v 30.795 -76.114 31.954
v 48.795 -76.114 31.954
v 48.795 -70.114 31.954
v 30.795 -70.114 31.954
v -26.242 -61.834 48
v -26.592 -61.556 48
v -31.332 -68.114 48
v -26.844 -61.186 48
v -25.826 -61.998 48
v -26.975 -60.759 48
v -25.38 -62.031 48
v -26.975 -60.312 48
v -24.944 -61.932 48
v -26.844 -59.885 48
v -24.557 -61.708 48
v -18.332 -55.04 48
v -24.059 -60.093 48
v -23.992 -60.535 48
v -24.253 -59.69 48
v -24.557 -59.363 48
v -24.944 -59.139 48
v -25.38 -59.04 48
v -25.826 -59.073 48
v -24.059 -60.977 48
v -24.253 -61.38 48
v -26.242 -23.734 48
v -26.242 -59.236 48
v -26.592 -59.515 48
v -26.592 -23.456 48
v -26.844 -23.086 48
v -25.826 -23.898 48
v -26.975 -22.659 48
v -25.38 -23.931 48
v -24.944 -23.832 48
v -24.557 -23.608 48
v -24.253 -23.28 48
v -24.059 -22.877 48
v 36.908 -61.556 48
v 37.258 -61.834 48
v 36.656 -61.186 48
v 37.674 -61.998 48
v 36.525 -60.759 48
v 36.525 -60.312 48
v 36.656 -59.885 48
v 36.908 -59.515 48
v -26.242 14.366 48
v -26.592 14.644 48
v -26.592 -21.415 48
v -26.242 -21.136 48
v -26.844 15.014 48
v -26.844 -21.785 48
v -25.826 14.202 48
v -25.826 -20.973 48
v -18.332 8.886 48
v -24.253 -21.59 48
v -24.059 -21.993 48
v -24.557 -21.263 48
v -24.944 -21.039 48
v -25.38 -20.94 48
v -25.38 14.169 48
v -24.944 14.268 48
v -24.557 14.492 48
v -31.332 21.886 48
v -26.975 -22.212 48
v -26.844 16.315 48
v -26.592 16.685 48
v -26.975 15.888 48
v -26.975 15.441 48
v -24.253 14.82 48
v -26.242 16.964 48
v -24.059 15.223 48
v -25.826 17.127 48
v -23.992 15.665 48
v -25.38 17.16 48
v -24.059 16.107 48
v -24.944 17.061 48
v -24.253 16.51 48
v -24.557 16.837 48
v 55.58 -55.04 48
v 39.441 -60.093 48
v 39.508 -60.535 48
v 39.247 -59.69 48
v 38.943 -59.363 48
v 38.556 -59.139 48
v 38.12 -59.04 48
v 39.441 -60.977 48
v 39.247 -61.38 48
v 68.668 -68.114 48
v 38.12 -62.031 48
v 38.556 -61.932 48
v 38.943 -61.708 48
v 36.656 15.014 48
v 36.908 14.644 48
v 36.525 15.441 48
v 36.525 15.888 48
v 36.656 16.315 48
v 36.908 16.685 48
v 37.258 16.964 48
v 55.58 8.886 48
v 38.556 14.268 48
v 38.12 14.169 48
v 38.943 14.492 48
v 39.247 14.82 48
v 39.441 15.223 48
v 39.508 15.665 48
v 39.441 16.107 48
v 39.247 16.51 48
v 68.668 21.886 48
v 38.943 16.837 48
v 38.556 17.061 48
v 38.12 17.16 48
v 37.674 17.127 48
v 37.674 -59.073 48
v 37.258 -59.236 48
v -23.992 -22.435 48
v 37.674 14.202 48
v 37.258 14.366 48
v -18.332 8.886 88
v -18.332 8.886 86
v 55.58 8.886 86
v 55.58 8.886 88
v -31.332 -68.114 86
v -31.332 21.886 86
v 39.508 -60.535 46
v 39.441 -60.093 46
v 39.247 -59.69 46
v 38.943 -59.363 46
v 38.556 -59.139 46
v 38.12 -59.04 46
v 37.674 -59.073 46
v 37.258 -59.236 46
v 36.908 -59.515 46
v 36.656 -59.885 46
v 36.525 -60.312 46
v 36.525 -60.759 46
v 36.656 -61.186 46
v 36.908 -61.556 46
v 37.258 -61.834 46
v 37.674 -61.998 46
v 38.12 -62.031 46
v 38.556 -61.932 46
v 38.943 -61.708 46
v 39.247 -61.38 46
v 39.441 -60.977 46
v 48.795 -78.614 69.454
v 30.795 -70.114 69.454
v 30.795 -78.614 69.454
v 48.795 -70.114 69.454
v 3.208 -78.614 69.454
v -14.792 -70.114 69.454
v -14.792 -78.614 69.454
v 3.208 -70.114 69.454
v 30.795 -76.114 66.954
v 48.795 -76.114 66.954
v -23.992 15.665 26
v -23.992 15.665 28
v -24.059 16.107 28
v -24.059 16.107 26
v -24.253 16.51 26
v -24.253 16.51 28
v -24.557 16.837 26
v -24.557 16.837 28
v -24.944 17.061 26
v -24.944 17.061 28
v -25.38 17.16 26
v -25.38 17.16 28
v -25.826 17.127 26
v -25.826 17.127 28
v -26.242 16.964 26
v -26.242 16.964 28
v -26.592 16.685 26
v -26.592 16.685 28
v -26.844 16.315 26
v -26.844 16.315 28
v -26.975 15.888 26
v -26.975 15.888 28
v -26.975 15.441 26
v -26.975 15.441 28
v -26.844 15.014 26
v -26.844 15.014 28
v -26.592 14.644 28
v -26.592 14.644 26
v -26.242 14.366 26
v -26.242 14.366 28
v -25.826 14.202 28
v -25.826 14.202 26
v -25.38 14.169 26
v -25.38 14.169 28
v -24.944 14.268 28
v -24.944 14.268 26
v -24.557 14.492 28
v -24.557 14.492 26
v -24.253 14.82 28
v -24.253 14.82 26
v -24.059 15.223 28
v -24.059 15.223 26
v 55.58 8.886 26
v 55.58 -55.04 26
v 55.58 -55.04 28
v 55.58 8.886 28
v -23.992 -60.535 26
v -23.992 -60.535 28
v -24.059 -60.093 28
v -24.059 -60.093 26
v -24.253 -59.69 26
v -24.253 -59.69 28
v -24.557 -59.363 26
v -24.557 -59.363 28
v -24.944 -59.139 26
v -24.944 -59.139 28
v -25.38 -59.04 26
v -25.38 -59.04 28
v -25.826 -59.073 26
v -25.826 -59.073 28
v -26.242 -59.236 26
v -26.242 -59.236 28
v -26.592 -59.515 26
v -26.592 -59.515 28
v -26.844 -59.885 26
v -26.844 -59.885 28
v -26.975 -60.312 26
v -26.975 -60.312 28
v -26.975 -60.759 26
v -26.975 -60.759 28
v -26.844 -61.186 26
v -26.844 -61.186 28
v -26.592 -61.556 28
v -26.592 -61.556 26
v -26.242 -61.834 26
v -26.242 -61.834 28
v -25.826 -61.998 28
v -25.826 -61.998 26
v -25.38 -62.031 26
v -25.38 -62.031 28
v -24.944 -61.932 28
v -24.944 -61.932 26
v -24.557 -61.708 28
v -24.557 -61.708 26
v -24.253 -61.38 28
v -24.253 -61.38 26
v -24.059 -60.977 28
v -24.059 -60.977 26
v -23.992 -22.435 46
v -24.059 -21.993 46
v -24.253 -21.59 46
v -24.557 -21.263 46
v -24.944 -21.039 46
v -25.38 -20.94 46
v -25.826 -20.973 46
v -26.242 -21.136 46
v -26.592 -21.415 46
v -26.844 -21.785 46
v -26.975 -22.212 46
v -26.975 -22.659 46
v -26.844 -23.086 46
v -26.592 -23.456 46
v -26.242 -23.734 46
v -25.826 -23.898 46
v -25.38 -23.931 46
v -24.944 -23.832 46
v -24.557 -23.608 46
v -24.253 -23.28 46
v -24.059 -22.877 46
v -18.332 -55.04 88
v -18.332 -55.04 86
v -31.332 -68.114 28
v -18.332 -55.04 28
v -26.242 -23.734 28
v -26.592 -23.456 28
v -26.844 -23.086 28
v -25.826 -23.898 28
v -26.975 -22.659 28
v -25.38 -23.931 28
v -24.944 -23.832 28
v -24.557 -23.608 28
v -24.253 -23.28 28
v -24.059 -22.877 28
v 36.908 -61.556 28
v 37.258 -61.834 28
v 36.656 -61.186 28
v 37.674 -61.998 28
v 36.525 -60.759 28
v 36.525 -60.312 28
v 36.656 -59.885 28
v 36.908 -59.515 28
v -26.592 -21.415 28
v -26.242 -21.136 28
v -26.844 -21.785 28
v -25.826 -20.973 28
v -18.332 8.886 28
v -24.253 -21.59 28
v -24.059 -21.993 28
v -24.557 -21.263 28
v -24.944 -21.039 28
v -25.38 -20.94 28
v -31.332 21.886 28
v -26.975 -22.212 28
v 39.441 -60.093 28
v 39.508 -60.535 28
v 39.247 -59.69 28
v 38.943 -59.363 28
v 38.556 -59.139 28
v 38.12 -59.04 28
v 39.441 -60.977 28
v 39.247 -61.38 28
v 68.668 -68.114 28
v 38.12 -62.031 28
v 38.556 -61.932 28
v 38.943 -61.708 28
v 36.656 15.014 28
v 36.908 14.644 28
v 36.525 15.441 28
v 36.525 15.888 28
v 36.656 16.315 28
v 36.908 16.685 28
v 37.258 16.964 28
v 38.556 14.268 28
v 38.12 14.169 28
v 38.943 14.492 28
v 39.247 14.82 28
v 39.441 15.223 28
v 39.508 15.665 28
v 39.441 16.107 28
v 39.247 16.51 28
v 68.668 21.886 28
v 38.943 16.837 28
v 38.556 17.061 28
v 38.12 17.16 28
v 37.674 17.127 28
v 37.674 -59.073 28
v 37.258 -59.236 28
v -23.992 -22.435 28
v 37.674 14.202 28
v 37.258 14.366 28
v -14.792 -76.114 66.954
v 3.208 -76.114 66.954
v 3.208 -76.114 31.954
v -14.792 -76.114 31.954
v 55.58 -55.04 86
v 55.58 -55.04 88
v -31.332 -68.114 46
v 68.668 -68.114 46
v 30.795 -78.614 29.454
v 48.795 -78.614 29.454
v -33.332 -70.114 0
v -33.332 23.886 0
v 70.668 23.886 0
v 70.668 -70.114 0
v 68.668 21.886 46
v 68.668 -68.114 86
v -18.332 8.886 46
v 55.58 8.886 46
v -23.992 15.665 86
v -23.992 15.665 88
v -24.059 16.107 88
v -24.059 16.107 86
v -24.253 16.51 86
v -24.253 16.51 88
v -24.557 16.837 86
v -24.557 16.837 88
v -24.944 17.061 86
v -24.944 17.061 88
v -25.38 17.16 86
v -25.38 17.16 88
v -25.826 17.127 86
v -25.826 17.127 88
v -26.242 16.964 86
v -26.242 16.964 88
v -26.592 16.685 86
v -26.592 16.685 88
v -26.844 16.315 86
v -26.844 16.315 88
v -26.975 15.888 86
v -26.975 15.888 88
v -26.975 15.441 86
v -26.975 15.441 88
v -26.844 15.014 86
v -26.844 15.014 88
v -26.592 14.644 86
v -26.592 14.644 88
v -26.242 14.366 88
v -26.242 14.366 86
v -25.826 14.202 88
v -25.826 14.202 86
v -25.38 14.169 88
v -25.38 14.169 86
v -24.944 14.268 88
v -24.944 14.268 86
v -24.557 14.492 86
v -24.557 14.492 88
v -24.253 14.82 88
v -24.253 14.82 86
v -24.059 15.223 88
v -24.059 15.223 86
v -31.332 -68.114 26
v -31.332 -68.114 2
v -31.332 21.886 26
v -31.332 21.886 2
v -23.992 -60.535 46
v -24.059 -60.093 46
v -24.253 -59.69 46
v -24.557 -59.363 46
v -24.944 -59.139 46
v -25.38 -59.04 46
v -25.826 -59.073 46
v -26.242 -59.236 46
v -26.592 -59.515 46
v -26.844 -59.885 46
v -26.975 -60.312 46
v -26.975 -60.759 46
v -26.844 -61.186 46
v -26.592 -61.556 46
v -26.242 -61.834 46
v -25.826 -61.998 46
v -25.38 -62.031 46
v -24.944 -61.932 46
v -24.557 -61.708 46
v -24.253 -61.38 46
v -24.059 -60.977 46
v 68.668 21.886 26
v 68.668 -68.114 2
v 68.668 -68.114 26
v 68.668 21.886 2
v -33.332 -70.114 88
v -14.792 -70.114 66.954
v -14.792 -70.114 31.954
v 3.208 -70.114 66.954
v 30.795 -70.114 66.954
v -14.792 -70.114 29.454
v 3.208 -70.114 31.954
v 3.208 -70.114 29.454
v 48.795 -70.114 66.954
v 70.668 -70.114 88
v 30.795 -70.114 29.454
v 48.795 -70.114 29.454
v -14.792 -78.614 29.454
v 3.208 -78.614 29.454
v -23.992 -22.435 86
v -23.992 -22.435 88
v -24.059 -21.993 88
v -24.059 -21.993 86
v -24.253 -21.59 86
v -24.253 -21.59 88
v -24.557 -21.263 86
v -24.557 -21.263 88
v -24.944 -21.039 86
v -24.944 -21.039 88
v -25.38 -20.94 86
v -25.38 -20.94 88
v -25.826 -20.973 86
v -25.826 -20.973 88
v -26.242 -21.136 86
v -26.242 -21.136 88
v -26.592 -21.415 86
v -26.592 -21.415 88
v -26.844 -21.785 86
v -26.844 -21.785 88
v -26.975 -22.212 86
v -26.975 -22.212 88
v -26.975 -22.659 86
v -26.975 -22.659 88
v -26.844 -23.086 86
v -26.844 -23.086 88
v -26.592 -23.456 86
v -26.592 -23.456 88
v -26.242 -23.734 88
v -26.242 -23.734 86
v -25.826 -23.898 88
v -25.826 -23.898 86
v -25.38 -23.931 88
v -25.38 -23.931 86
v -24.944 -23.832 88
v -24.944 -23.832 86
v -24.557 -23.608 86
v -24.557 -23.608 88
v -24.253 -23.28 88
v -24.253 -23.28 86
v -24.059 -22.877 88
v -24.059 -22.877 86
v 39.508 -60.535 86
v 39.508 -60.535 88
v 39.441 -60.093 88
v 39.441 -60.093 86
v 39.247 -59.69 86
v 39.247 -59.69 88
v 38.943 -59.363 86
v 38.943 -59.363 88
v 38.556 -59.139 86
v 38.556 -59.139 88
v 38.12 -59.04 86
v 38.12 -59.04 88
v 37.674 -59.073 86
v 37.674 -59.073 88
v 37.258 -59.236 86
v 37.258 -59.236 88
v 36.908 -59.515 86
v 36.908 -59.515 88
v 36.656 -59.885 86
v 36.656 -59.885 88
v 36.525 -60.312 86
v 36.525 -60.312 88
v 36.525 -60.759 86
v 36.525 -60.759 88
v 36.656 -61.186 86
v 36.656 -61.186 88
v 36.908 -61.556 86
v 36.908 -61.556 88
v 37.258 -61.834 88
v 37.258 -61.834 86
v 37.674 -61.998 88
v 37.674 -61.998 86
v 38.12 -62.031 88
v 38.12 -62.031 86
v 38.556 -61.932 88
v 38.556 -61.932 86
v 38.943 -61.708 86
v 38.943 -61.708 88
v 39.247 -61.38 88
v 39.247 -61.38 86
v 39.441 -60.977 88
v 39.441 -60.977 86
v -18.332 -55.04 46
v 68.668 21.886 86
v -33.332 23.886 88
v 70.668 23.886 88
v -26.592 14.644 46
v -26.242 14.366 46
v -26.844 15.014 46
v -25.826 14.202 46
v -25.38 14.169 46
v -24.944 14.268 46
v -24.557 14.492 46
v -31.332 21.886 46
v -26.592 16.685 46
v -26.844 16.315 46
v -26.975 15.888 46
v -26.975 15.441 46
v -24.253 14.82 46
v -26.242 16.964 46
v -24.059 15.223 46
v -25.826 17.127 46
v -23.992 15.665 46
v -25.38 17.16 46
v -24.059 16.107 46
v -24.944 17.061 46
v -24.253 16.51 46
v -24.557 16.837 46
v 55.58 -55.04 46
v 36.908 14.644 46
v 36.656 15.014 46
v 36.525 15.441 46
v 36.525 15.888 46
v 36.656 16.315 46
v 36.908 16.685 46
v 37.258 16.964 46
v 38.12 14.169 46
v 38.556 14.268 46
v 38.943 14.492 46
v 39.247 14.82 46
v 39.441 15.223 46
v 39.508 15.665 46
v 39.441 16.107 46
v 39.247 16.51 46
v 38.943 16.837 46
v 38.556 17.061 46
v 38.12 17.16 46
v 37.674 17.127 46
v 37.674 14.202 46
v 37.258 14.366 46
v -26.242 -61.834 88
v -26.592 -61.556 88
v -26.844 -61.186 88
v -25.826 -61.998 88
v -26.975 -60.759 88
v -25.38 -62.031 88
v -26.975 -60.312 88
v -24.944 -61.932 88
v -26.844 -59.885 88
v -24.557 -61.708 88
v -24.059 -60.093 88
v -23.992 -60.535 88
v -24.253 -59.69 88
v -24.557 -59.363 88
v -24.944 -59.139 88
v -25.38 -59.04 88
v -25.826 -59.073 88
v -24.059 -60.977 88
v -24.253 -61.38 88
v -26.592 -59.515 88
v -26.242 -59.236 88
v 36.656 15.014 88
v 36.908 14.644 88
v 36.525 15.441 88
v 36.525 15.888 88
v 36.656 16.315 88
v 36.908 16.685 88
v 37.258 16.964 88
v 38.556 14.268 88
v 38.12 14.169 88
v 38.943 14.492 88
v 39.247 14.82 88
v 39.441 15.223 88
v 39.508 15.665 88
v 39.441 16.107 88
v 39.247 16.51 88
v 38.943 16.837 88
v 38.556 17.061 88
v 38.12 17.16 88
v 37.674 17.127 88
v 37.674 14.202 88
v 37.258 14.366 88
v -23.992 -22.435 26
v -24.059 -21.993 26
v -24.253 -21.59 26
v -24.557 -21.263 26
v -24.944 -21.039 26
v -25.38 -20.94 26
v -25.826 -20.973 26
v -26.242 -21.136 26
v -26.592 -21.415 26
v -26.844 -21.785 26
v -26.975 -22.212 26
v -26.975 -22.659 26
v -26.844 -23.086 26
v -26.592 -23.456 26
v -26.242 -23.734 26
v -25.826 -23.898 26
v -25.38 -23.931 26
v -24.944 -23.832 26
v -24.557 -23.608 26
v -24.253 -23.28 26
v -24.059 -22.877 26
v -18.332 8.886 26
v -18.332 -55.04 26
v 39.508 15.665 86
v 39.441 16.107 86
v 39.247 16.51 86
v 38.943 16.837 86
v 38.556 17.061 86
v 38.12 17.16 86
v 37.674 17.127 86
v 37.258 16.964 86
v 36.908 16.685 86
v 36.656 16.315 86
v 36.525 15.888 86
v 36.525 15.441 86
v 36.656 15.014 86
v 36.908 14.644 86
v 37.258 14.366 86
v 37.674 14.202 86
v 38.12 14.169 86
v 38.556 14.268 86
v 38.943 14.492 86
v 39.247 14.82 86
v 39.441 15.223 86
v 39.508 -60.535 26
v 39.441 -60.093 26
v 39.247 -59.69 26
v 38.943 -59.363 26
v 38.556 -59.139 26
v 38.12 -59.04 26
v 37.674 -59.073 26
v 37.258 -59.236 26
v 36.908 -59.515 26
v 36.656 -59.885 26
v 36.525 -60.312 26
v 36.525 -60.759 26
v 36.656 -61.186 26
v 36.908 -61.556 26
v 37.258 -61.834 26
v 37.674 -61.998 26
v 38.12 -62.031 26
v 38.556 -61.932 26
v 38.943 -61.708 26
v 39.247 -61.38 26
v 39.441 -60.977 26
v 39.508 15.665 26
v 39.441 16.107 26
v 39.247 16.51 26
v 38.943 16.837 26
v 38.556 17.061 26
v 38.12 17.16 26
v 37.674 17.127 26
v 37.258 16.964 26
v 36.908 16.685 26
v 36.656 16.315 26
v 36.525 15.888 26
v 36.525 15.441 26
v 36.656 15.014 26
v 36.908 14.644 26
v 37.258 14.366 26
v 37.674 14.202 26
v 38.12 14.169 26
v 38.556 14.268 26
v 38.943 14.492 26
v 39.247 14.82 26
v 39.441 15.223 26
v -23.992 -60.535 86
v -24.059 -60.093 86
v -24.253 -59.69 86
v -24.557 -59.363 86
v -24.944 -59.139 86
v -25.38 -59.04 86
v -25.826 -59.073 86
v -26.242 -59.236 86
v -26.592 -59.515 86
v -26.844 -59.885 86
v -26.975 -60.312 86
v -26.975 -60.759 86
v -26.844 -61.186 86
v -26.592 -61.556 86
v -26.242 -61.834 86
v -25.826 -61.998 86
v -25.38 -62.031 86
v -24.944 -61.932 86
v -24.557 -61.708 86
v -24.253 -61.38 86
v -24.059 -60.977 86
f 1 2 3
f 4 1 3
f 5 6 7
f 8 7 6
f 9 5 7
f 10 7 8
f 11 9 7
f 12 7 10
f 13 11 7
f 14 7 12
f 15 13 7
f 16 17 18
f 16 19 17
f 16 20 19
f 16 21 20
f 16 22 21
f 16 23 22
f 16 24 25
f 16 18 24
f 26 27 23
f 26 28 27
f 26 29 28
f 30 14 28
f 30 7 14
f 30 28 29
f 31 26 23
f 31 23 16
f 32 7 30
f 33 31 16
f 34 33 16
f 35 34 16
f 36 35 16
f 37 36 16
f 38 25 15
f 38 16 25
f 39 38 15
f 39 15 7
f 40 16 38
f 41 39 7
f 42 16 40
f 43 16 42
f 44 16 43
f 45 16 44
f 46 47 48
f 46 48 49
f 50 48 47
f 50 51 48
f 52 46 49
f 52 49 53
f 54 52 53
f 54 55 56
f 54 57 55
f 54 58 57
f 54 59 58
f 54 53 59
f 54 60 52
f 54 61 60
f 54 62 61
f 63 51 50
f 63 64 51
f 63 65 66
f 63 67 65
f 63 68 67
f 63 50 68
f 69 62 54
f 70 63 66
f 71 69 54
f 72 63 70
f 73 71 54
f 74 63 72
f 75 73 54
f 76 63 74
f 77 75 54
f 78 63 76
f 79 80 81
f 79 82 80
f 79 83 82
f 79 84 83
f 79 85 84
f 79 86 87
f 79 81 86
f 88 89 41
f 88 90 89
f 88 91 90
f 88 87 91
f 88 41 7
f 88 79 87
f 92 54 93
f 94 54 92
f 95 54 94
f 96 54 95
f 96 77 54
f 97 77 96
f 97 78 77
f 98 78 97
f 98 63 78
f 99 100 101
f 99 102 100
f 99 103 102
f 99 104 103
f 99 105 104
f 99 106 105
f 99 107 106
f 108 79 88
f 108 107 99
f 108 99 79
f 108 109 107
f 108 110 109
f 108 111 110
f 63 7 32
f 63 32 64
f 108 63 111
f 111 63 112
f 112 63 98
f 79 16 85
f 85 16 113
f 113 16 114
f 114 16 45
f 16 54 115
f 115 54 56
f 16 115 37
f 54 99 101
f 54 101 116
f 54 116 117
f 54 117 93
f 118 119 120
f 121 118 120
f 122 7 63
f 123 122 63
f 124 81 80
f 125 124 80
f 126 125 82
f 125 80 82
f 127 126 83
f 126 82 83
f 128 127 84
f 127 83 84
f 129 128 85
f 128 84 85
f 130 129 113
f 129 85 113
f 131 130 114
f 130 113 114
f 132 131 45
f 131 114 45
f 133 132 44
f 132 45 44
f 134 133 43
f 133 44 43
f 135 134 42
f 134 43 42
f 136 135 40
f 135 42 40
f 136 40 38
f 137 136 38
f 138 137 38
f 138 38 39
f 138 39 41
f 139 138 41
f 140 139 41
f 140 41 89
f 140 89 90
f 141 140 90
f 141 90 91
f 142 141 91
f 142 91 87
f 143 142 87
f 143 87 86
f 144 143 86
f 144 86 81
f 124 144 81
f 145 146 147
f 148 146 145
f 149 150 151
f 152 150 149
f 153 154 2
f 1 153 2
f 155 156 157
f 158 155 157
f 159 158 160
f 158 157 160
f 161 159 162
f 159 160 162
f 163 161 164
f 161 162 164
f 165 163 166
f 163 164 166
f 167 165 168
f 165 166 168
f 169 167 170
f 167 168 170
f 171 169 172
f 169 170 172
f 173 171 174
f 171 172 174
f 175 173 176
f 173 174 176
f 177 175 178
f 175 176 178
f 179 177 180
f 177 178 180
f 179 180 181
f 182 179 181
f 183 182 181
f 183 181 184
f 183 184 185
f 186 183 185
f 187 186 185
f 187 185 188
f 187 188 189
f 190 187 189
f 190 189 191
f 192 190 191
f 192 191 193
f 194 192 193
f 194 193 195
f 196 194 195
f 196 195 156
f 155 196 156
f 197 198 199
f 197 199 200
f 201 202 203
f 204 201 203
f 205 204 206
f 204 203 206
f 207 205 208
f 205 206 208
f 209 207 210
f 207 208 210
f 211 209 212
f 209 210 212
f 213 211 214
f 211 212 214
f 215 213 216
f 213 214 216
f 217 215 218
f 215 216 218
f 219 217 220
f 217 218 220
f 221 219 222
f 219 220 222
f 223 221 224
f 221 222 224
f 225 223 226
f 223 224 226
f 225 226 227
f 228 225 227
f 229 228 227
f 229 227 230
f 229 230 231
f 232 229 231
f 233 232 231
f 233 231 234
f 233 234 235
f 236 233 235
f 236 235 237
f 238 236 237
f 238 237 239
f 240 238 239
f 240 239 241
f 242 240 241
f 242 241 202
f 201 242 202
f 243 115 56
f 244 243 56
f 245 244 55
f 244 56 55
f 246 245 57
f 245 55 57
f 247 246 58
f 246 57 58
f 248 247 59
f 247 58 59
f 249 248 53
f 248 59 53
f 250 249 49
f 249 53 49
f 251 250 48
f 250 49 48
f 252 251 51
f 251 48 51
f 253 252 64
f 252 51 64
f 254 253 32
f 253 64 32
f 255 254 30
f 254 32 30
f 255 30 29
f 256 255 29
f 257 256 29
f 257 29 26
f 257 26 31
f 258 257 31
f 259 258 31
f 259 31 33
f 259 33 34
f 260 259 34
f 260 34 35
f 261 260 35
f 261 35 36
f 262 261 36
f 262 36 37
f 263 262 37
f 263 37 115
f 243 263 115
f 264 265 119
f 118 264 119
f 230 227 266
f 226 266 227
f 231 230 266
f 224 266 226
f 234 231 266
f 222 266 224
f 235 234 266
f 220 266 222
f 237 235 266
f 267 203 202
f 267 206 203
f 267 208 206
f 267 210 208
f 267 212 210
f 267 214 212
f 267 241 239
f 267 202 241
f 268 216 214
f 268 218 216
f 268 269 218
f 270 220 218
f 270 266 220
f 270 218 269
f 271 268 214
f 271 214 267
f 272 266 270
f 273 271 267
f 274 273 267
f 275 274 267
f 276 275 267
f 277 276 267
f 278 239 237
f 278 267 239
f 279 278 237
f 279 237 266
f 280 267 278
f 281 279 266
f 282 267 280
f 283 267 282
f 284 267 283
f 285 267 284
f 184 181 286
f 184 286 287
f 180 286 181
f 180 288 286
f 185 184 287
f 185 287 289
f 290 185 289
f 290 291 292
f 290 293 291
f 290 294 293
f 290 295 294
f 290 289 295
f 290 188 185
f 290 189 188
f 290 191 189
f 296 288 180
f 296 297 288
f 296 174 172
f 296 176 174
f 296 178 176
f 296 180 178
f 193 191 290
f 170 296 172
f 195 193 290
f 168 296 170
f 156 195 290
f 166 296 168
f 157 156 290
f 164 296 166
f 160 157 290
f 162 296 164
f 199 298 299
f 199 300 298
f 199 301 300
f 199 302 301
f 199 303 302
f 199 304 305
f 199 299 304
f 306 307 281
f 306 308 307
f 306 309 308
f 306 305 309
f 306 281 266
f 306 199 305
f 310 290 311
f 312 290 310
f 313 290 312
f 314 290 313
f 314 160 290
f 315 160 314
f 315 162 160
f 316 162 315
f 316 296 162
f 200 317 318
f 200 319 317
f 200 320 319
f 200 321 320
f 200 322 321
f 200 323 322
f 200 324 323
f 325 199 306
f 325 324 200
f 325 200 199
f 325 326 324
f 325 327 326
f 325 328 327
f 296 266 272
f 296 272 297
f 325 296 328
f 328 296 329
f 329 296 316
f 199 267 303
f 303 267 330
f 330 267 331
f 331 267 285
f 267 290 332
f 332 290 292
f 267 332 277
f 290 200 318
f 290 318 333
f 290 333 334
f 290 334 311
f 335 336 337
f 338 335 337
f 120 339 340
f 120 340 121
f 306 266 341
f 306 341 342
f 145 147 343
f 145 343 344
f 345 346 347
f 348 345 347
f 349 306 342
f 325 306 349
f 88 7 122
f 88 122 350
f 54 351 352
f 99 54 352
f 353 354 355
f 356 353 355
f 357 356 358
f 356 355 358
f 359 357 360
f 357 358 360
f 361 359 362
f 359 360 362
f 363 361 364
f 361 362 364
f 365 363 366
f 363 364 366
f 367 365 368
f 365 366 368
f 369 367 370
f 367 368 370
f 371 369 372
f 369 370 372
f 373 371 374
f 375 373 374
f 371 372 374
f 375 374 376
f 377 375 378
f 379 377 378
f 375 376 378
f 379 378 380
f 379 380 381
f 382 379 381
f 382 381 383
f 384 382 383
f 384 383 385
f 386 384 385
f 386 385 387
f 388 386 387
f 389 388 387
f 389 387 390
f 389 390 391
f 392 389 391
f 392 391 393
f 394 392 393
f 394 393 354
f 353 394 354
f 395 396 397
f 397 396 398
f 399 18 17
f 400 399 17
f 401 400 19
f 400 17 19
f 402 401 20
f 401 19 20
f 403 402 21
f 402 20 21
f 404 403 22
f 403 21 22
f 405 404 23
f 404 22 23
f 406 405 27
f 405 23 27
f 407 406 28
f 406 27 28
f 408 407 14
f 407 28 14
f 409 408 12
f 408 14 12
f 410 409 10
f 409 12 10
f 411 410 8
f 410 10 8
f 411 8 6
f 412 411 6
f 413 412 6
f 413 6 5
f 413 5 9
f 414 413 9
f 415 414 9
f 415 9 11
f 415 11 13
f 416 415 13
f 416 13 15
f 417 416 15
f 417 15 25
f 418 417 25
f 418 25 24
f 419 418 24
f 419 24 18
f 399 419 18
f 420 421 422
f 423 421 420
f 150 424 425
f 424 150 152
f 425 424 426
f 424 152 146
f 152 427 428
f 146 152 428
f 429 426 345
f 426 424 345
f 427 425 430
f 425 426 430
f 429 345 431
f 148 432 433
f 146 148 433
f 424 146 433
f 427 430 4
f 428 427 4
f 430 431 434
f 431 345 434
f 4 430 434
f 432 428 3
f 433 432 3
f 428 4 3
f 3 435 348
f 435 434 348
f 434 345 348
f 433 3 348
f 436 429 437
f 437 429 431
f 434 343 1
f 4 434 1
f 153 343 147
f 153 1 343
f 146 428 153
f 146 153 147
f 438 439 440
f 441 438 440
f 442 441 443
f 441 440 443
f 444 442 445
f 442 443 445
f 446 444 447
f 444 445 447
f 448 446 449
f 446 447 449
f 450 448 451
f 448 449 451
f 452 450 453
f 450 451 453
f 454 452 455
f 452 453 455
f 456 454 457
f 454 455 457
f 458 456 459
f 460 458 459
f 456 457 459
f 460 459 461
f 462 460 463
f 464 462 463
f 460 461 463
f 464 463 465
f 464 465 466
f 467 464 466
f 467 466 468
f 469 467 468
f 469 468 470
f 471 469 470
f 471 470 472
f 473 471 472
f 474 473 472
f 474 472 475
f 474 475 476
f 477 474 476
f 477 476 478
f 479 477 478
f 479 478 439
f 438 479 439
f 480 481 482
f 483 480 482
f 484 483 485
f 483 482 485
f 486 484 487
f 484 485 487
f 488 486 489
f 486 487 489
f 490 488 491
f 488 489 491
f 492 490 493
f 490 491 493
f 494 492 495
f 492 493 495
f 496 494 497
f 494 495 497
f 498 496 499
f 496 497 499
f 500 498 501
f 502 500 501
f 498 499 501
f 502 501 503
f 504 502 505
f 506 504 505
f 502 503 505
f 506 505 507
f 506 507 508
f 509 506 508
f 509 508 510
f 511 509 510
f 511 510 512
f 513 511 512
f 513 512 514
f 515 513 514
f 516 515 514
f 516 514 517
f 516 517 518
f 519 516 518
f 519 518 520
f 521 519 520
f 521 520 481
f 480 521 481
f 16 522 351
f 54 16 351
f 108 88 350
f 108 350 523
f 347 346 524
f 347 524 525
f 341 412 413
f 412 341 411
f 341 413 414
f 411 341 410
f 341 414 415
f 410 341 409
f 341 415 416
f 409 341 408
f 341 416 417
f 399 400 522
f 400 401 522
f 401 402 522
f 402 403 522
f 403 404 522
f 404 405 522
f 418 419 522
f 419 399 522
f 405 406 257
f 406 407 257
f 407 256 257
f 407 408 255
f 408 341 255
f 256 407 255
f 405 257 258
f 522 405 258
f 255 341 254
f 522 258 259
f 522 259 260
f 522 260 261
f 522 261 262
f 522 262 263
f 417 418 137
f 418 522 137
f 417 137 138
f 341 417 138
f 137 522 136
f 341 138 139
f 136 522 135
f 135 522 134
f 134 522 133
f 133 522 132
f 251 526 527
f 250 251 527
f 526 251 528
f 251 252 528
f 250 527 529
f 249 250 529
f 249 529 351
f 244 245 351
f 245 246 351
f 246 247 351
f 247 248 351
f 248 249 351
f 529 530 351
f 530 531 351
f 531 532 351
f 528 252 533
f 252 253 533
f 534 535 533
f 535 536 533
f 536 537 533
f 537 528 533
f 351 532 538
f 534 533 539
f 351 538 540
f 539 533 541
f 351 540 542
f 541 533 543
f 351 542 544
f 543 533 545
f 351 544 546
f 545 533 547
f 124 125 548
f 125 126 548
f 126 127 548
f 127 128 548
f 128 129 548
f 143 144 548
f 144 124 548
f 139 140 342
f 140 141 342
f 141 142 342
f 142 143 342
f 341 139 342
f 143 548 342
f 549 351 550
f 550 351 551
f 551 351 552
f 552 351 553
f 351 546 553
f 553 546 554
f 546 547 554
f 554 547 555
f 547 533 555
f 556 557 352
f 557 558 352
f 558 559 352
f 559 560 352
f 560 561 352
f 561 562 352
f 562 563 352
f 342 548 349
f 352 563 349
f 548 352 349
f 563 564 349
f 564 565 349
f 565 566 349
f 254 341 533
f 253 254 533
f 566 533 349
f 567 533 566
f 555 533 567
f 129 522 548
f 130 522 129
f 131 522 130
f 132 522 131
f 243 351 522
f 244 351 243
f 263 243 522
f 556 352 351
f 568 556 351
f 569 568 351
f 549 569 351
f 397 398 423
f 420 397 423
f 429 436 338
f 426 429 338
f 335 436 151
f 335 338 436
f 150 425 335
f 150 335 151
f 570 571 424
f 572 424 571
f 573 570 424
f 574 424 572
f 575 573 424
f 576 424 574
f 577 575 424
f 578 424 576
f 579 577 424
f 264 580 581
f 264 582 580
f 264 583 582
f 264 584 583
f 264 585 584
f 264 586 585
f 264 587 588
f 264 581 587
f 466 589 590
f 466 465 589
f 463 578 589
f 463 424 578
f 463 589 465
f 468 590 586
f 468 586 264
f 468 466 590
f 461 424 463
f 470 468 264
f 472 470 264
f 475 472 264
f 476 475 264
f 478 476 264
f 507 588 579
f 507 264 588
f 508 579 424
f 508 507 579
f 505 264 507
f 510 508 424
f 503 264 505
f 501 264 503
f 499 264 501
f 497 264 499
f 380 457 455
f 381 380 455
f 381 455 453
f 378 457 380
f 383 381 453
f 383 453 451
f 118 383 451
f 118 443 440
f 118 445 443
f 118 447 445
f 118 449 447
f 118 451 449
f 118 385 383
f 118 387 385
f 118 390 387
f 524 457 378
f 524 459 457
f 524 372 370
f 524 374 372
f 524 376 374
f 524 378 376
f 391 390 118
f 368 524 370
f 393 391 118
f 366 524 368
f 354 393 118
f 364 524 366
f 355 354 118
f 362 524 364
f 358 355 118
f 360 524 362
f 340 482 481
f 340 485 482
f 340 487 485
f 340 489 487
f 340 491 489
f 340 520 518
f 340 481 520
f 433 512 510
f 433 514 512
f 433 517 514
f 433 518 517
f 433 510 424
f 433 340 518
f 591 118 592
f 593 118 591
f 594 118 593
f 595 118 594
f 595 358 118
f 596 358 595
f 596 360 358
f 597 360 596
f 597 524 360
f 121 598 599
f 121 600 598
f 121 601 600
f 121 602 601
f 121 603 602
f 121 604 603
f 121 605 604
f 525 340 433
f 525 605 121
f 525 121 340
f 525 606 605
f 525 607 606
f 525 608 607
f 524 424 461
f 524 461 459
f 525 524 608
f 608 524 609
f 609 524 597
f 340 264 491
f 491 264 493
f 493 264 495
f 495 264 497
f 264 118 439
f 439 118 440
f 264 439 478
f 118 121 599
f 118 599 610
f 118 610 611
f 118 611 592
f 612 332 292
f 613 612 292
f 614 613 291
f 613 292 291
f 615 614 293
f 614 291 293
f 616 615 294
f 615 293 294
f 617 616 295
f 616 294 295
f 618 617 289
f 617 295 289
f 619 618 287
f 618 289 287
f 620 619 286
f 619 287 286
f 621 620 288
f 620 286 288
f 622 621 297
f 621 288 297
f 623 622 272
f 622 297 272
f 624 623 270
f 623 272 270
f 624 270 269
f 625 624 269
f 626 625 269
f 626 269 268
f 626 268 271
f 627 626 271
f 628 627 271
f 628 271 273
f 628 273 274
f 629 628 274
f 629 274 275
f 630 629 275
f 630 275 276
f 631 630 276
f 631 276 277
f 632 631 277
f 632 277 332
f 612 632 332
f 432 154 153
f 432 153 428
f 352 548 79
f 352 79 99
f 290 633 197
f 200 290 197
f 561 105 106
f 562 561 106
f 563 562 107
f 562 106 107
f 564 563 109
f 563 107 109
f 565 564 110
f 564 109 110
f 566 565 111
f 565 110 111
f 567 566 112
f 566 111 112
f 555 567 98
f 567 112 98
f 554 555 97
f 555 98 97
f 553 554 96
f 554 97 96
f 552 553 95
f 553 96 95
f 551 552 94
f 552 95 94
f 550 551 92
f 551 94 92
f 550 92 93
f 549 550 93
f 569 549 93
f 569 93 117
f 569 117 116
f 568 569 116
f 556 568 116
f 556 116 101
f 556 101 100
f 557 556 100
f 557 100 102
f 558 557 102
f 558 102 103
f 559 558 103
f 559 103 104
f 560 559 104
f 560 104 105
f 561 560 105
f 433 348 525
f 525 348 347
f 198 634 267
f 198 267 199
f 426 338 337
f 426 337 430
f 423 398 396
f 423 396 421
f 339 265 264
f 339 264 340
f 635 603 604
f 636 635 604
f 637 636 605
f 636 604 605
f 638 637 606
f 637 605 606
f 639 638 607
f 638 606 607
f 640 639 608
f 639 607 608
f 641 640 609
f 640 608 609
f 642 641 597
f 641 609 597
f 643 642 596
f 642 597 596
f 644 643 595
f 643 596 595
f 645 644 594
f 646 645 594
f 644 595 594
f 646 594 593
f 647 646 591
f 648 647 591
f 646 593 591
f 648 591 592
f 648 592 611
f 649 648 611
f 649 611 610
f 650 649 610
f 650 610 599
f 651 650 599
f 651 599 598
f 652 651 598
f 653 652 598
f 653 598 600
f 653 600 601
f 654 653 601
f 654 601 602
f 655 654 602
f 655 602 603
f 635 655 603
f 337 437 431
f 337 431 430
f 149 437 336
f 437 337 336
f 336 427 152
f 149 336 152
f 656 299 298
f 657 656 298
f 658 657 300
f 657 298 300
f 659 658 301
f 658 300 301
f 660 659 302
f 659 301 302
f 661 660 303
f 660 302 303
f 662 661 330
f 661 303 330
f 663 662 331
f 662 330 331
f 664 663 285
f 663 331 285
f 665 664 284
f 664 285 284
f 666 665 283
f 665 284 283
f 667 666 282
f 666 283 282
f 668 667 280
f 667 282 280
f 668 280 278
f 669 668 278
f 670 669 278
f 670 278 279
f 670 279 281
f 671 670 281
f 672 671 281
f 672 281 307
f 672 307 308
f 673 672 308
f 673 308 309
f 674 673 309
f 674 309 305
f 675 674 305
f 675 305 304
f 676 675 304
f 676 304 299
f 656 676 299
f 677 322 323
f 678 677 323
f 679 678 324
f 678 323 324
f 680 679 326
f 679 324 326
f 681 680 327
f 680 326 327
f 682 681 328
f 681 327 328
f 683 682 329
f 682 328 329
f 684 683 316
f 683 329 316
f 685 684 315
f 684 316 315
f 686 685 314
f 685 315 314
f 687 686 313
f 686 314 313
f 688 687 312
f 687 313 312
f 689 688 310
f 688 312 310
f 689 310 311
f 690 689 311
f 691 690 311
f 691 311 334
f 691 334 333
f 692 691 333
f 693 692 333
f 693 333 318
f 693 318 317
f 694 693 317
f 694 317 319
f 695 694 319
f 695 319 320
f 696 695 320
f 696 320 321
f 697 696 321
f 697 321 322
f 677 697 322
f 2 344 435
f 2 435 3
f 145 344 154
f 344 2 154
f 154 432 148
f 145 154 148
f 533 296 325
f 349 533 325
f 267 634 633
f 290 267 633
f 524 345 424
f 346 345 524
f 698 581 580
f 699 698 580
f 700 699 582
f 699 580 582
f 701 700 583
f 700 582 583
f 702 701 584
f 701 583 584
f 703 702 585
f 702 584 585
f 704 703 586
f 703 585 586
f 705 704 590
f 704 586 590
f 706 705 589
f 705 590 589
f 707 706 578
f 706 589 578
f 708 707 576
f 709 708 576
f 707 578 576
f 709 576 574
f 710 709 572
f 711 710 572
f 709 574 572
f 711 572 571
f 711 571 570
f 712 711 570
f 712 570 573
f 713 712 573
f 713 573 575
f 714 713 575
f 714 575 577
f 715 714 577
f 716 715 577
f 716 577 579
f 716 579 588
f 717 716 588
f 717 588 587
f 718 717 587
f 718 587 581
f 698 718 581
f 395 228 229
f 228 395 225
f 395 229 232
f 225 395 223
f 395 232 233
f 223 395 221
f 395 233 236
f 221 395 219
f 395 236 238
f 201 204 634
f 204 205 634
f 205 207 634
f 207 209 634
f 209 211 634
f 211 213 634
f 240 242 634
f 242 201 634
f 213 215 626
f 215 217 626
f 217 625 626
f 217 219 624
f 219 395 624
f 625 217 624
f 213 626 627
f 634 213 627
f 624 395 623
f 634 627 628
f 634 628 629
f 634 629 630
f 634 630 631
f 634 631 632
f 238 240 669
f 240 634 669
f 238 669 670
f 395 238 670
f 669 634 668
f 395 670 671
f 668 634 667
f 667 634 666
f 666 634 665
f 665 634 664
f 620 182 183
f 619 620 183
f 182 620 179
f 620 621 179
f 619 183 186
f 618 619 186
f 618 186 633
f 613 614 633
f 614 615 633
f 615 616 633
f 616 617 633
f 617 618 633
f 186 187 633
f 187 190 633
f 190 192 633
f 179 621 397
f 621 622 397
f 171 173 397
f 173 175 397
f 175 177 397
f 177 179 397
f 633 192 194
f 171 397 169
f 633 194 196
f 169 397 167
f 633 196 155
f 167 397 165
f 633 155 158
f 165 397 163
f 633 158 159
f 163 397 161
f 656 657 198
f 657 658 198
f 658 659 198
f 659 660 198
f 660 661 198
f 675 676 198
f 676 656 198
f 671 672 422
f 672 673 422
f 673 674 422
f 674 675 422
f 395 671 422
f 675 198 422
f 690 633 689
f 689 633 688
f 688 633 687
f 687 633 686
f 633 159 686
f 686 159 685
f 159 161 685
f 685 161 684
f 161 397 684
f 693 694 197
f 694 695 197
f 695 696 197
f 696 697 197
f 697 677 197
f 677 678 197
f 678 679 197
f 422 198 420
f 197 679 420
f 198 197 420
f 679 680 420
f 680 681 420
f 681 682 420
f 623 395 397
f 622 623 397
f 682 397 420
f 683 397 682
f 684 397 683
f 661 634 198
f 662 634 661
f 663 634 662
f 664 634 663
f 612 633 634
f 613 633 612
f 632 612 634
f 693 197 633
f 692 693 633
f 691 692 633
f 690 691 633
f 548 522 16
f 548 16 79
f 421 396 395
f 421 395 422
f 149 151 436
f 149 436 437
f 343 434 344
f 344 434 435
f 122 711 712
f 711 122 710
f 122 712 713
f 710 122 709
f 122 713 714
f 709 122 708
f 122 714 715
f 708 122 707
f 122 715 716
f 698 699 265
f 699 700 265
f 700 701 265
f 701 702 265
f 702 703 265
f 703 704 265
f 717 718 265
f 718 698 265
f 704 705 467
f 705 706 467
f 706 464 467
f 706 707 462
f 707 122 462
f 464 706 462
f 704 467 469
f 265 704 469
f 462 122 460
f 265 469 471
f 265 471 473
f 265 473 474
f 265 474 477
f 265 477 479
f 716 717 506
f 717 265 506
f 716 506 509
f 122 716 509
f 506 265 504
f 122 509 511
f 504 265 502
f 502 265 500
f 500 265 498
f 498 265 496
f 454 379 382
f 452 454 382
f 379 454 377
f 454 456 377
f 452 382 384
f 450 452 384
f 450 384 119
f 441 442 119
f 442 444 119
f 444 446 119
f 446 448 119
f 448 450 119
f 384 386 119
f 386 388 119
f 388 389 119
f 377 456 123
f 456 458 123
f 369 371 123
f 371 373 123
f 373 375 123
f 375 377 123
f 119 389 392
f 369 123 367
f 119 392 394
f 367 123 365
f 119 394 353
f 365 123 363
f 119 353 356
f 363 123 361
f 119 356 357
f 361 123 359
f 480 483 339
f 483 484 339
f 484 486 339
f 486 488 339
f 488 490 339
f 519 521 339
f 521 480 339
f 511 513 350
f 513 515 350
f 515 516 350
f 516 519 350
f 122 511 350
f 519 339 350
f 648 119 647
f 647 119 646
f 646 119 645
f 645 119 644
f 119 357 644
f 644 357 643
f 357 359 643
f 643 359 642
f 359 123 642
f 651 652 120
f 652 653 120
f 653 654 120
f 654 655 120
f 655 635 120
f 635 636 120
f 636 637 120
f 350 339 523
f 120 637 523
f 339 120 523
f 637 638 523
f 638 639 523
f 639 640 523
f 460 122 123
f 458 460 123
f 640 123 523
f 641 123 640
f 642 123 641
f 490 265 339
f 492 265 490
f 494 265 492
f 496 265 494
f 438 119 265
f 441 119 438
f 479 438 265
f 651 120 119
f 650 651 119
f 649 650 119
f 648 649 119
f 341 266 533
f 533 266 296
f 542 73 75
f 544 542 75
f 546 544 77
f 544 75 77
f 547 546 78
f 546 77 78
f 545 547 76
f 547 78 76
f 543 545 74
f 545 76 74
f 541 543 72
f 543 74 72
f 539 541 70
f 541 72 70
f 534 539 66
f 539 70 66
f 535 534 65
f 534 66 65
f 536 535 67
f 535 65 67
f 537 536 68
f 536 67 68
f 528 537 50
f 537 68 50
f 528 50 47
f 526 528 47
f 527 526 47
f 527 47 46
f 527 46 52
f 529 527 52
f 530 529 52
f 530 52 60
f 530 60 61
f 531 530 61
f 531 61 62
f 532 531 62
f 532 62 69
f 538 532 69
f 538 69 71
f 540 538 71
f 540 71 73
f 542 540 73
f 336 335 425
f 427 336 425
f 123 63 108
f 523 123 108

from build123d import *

# Parameters (mm, degrees)
SKETCH3_W           = 104
SKETCH3_H           = 94
SKETCH3_W_2         = 100
SKETCH3_H_2         = 90
EXTRUDE_THIN1_DEPTH = 86
SKETCH3_2_W         = 100
SKETCH3_2_H         = 90
BOSS_EXTRUDE1_DEPTH = 2
SKETCH6_W           = 104
SKETCH6_H           = 94
SKETCH6_W_2         = 73.912331144
SKETCH6_H_2         = 63.926876015
BOSS_EXTRUDE2_DEPTH = 2
LPATTERN1_COUNT     = 2
LPATTERN1_PITCH     = 40
LPATTERN2_COUNT     = 2
LPATTERN2_PITCH     = 60
CUT_EXTRUDE1_REACH  = 134.868
SKETCH9_R           = 1.5
SKETCH10_W          = 18
SKETCH10_H          = 40
BOSS_EXTRUDE3_DEPTH = 8.5
SKETCH12_W          = 35
SKETCH12_H          = 6
CUT_EXTRUDE2_DEPTH  = 65.5


with BuildPart() as part:
    # Sketch3 → Extrude-Thin1 (new body)
    with BuildSketch(Plane.XY):
        with Locations((18.667779633, -23.113522538)):
            Rectangle(SKETCH3_W, SKETCH3_H)
        with Locations((18.667779633, -23.113522538)):
            Rectangle(SKETCH3_W_2, SKETCH3_H_2, mode=Mode.SUBTRACT)
    extrude(amount=EXTRUDE_THIN1_DEPTH)

    # Sketch3<2> → Boss-Extrude1 (add)
    with BuildSketch(Plane.XY):
        with Locations((18.667779633, -23.113522538)):
            Rectangle(SKETCH3_2_W, SKETCH3_2_H)
    extrude(amount=BOSS_EXTRUDE1_DEPTH)

    # Sketch6 → Boss-Extrude2 (add)
    with BuildSketch(Plane.XY.offset(86)):
        with Locations((18.667779633, -23.113522538)):
            Rectangle(SKETCH6_W, SKETCH6_H)
        with Locations((18.623945205, -23.076960546)):
            Rectangle(SKETCH6_W_2, SKETCH6_H_2, mode=Mode.SUBTRACT)
    boss_extrude2 = extrude(amount=BOSS_EXTRUDE2_DEPTH)

    # LPattern1: Boss-Extrude2 ×2
    with Locations(*[(0, 0, -i * LPATTERN1_PITCH) for i in range(1, LPATTERN1_COUNT)]):
        add(boss_extrude2)

    # LPattern2: Boss-Extrude2 ×2
    with Locations(*[(0, 0, -i * LPATTERN2_PITCH) for i in range(1, LPATTERN2_COUNT)]):
        add(boss_extrude2)

    # Cut-Extrude1: up to this face of the body (flat: up to its plane)
    cut_extrude1_end = Plane(part.part.faces().sort_by_distance((18.667779633, -23.113522538, 2))[0])
    # Sketch9 → Cut-Extrude1 (cut, up to the picked face)
    with BuildSketch(Plane.XY.offset(88), mode=Mode.PRIVATE) as cut_extrude1_sk1:
        with Locations((-25.492242635, 15.664652421)):
            Circle(SKETCH9_R)
    cut_extrude1_tool1 = split(extrude(cut_extrude1_sk1.sketch, amount=-CUT_EXTRUDE1_REACH, mode=Mode.PRIVATE), bisect_by=cut_extrude1_end, keep=Keep.BOTH, mode=Mode.PRIVATE)
    # Sketch9 → Cut-Extrude1 (cut, up to the picked face)
    with BuildSketch(Plane.XY.offset(88), mode=Mode.PRIVATE) as cut_extrude1_sk2:
        with Locations((38.007757365, 15.664652421)):
            Circle(SKETCH9_R)
    cut_extrude1_tool2 = split(extrude(cut_extrude1_sk2.sketch, amount=-CUT_EXTRUDE1_REACH, mode=Mode.PRIVATE), bisect_by=cut_extrude1_end, keep=Keep.BOTH, mode=Mode.PRIVATE)
    # Sketch9 → Cut-Extrude1 (cut, up to the picked face)
    with BuildSketch(Plane.XY.offset(88), mode=Mode.PRIVATE) as cut_extrude1_sk3:
        with Locations((38.007757365, -22.435347579)):
            Circle(SKETCH9_R)
    cut_extrude1_tool3 = split(extrude(cut_extrude1_sk3.sketch, amount=-CUT_EXTRUDE1_REACH, mode=Mode.PRIVATE), bisect_by=cut_extrude1_end, keep=Keep.BOTH, mode=Mode.PRIVATE)
    # Sketch9 → Cut-Extrude1 (cut, up to the picked face)
    with BuildSketch(Plane.XY.offset(88), mode=Mode.PRIVATE) as cut_extrude1_sk4:
        with Locations((38.007757365, -60.535347579)):
            Circle(SKETCH9_R)
    cut_extrude1_tool4 = split(extrude(cut_extrude1_sk4.sketch, amount=-CUT_EXTRUDE1_REACH, mode=Mode.PRIVATE), bisect_by=cut_extrude1_end, keep=Keep.BOTH, mode=Mode.PRIVATE)
    # Sketch9 → Cut-Extrude1 (cut, up to the picked face)
    with BuildSketch(Plane.XY.offset(88), mode=Mode.PRIVATE) as cut_extrude1_sk5:
        with Locations((-25.492242635, -22.435347579)):
            Circle(SKETCH9_R)
    cut_extrude1_tool5 = split(extrude(cut_extrude1_sk5.sketch, amount=-CUT_EXTRUDE1_REACH, mode=Mode.PRIVATE), bisect_by=cut_extrude1_end, keep=Keep.BOTH, mode=Mode.PRIVATE)
    # Sketch9 → Cut-Extrude1 (cut, up to the picked face)
    with BuildSketch(Plane.XY.offset(88), mode=Mode.PRIVATE) as cut_extrude1_sk6:
        with Locations((-25.492242635, -60.535347579)):
            Circle(SKETCH9_R)
    cut_extrude1_tool6 = split(extrude(cut_extrude1_sk6.sketch, amount=-CUT_EXTRUDE1_REACH, mode=Mode.PRIVATE), bisect_by=cut_extrude1_end, keep=Keep.BOTH, mode=Mode.PRIVATE)
    add(cut_extrude1_tool1.solids().sort_by(Axis((-25.492243, 15.664652, 88), (0, 0, -1)))[0], mode=Mode.SUBTRACT)
    add(cut_extrude1_tool2.solids().sort_by(Axis((38.007757, 15.664652, 88), (0, 0, -1)))[0], mode=Mode.SUBTRACT)
    add(cut_extrude1_tool3.solids().sort_by(Axis((38.007757, -22.435348, 88), (0, 0, -1)))[0], mode=Mode.SUBTRACT)
    add(cut_extrude1_tool4.solids().sort_by(Axis((38.007757, -60.535348, 88), (0, 0, -1)))[0], mode=Mode.SUBTRACT)
    add(cut_extrude1_tool5.solids().sort_by(Axis((-25.492243, -22.435348, 88), (0, 0, -1)))[0], mode=Mode.SUBTRACT)
    add(cut_extrude1_tool6.solids().sort_by(Axis((-25.492243, -60.535348, 88), (0, 0, -1)))[0], mode=Mode.SUBTRACT)

    # Sketch10 → Boss-Extrude3 (add)
    with BuildSketch(Plane.XZ.offset(70.113522538)):
        with Locations((-5.791529817, 49.453628138)):
            Rectangle(SKETCH10_W, SKETCH10_H)
        with Locations((39.794952927, 49.453628138)):
            Rectangle(SKETCH10_W, SKETCH10_H)
    extrude(amount=BOSS_EXTRUDE3_DEPTH)

    # Sketch12 → Cut-Extrude2 (cut)
    with BuildSketch(Plane(origin=(48.794952927, 0, 0), x_dir=(0, 0, -1), z_dir=(1, 0, 0))):
        with Locations((-49.453628138, -73.113522538)):
            Rectangle(SKETCH12_W, SKETCH12_H)
    extrude(amount=-CUT_EXTRUDE2_DEPTH, mode=Mode.SUBTRACT)


solid = part.part
